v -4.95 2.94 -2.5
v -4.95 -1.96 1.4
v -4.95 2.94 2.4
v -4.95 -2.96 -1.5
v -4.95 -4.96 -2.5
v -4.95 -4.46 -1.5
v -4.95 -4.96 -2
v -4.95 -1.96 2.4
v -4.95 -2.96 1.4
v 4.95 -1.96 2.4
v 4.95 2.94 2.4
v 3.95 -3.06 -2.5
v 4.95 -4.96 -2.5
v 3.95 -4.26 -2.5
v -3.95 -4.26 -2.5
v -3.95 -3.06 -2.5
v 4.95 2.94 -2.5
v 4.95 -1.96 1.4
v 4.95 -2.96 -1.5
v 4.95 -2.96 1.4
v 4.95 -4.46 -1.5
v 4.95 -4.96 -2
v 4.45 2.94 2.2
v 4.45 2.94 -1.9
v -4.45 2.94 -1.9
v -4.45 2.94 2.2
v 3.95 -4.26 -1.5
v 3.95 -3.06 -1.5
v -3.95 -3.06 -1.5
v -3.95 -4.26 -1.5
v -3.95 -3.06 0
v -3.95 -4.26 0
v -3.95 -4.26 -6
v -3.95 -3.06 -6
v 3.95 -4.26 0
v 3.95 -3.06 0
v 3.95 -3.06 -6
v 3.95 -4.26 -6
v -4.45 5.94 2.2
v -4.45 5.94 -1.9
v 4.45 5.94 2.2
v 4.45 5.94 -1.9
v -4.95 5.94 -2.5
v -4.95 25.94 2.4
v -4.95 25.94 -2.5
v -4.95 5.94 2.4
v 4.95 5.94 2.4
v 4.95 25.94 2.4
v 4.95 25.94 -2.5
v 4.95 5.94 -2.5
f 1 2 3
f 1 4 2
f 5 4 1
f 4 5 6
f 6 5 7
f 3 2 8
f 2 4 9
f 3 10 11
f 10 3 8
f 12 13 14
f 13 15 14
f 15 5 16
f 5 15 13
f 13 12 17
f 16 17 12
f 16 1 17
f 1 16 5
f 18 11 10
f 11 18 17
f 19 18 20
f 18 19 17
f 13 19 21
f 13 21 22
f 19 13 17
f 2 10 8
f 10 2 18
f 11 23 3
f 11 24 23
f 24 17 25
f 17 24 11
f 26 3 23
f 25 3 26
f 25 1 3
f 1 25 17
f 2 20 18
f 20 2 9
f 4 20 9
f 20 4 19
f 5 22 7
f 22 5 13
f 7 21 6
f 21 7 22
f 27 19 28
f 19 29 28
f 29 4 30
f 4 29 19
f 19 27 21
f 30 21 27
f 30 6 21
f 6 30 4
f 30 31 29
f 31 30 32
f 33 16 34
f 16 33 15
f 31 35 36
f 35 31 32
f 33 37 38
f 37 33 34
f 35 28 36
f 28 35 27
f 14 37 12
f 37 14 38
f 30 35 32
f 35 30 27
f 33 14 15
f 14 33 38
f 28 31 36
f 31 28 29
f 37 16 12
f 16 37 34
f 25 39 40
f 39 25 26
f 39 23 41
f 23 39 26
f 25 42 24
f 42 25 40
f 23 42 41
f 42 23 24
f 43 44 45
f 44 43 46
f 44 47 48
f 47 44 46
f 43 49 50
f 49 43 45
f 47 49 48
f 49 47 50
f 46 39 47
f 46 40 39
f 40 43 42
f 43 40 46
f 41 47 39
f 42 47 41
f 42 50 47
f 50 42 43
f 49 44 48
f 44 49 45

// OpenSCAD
N=3;
A=2.4+N*2.5;
rotate([0,0,180])
translate([-A/2,-2.94,-2.5])
{
	cube([A,4.9,4.9]);
	cube([A,5.9,3.9]);
	hull()
	{
		cube([A,7.4,1]);
		cube([A,7.9,0.5]);
	}
	translate([1,6,-3.5])cube([A-2,1.2,6]);
	// Plug
	translate([0.5,-20,0.6])cube([A-1,21,4.1]);
	translate([0,-23,0])cube([A,20,4.9]);
}
